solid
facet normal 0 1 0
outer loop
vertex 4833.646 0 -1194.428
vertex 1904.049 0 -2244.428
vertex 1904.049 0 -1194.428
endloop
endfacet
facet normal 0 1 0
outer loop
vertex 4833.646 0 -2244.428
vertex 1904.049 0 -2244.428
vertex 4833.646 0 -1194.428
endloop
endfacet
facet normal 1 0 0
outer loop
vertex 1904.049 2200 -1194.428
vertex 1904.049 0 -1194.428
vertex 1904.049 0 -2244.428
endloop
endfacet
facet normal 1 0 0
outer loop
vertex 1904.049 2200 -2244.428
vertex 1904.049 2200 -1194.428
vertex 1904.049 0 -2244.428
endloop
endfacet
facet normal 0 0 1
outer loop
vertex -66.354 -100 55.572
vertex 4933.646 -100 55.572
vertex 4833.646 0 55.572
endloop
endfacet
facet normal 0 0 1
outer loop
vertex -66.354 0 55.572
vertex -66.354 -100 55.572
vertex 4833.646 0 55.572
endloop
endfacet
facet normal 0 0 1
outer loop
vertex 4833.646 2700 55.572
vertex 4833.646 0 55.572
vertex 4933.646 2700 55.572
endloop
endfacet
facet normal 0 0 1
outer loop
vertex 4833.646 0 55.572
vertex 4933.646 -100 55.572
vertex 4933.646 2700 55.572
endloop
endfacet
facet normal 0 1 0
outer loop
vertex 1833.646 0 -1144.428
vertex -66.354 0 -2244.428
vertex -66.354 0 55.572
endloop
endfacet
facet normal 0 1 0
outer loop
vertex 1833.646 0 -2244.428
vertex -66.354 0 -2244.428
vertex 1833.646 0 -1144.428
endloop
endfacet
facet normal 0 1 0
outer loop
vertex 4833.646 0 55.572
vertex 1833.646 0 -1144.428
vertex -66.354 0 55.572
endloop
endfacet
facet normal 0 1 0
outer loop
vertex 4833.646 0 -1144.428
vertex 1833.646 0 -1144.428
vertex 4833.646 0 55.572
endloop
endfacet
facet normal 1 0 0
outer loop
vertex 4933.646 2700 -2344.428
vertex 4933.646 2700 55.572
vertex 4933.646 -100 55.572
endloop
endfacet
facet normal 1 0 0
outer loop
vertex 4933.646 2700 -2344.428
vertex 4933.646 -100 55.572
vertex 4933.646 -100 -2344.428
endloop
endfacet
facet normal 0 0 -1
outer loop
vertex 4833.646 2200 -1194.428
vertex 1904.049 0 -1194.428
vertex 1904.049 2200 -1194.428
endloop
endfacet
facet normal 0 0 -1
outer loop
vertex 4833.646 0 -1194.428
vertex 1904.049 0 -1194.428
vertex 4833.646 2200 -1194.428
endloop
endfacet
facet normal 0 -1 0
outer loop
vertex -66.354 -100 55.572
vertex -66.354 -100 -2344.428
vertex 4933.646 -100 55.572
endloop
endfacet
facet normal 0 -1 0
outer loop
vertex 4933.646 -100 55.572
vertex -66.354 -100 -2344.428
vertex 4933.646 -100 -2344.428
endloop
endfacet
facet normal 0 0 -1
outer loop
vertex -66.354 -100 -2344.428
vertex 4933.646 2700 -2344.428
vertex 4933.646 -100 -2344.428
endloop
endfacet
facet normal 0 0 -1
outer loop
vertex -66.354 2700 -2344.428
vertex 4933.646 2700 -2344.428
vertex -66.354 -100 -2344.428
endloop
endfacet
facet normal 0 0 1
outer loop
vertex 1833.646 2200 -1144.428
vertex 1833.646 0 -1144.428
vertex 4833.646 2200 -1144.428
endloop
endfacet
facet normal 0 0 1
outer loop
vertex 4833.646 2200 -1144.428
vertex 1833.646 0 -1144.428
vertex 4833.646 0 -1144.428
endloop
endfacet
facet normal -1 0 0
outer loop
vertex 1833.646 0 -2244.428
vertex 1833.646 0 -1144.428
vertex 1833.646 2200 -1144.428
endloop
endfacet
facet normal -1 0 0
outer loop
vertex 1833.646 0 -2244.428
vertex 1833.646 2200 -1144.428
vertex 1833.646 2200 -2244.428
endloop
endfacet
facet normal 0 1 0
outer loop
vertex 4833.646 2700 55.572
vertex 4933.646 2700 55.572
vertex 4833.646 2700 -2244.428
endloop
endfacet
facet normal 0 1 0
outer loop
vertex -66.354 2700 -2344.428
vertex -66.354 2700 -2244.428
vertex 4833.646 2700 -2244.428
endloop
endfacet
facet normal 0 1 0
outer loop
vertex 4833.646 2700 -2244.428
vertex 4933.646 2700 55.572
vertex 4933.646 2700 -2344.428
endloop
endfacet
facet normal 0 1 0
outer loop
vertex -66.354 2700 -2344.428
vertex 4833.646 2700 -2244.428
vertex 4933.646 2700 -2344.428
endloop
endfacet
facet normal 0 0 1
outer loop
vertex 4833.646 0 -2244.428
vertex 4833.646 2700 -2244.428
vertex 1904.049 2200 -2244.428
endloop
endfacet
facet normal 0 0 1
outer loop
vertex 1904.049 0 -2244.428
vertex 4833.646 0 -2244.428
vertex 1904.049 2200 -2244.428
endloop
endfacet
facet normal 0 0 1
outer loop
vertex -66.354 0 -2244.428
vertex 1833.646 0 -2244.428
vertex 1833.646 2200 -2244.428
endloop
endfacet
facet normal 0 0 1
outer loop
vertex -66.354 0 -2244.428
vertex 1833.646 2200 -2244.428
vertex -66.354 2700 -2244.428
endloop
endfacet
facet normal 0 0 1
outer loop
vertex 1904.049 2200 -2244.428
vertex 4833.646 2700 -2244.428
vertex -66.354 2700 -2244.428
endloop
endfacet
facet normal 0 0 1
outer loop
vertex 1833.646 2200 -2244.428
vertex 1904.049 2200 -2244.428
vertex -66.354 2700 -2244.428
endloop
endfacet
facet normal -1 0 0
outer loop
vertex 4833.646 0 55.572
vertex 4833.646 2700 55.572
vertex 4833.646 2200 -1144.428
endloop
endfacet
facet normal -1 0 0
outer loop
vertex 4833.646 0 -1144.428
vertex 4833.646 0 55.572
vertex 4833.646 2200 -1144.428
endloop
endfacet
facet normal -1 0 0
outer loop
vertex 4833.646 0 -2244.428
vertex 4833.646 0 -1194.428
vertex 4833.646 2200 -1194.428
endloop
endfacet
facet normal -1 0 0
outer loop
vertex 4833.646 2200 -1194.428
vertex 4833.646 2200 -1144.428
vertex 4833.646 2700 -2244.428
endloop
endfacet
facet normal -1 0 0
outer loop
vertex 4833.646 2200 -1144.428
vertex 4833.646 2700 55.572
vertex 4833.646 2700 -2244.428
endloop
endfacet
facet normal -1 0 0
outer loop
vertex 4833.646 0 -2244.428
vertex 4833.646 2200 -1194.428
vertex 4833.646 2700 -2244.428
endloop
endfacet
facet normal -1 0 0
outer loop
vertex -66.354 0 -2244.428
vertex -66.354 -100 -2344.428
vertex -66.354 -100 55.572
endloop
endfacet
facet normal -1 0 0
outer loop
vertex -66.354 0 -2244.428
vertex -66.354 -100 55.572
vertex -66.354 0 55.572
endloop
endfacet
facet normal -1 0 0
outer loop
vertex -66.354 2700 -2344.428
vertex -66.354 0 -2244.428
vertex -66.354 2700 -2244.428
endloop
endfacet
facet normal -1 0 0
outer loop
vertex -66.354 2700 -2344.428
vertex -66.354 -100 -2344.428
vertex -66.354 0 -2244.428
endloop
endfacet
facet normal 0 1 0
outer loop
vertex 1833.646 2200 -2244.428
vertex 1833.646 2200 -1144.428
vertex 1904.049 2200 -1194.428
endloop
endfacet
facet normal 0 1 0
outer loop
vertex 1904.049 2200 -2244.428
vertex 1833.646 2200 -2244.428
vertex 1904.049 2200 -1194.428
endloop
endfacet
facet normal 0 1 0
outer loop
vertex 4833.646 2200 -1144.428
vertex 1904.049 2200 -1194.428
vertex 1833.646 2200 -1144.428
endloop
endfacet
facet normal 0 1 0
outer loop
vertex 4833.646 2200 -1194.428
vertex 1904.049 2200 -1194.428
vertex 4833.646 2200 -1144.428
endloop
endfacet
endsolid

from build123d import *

# Parameters (mm, degrees)
ESQUISSE1_W        = 5000
ESQUISSE1_H        = 2400
BOSS_EXTRU_1_DEPTH = 100
ESQUISSE2_W        = 5000
ESQUISSE2_H        = 2700
BOSS_EXTRU_2_DEPTH = 100
ESQUISSE3_W        = 2400
ESQUISSE3_H        = 2700
BOSS_EXTRU_3_DEPTH = 100
ESQUISSE22_W       = 70.403025722
ESQUISSE22_H       = 1100
BOSS_EXTRU_8_DEPTH = 2200
ESQUISSE23_W       = 3000
ESQUISSE23_H       = 50
BOSS_EXTRU_9_DEPTH = 2200


with BuildPart() as part:
    # Esquisse1 → Boss.-Extru.1 (new body)
    with BuildSketch(Plane(origin=(0, 0, 0), x_dir=(1, 0, 0), z_dir=(0, 1, 0))):
        with Locations((2433.645902302, 1144.428443178)):
            Rectangle(ESQUISSE1_W, ESQUISSE1_H)
    extrude(amount=-BOSS_EXTRU_1_DEPTH)

    # Esquisse2 → Boss.-Extru.2 (add)
    with BuildSketch(Plane(origin=(0, 0, -2344.428443178), x_dir=(-1, 0, 0), z_dir=(0, 0, -1))):
        with Locations((-2433.645902302, 1350)):
            Rectangle(ESQUISSE2_W, ESQUISSE2_H)
    extrude(amount=-BOSS_EXTRU_2_DEPTH)

    # Esquisse3 → Boss.-Extru.3 (add)
    with BuildSketch(Plane(origin=(4933.645902302, 0, 0), x_dir=(0, 0, -1), z_dir=(1, 0, 0))):
        with Locations((1144.428443178, 1350)):
            Rectangle(ESQUISSE3_W, ESQUISSE3_H)
    extrude(amount=-BOSS_EXTRU_3_DEPTH)

    # Esquisse22 → Boss.-Extru.8 (add)
    with BuildSketch(Plane(origin=(0, 0, 0), x_dir=(1, 0, 0), z_dir=(0, 1, 0))):
        with Locations((1868.847415163, 1694.428443178)):
            Rectangle(ESQUISSE22_W, ESQUISSE22_H)
    extrude(amount=BOSS_EXTRU_8_DEPTH)

    # Esquisse23 → Boss.-Extru.9 (add)
    with BuildSketch(Plane(origin=(0, 0, 0), x_dir=(1, 0, 0), z_dir=(0, 1, 0))):
        with Locations((3333.645902302, 1169.428443178)):
            Rectangle(ESQUISSE23_W, ESQUISSE23_H)
    extrude(amount=BOSS_EXTRU_9_DEPTH)


solid = part.part
